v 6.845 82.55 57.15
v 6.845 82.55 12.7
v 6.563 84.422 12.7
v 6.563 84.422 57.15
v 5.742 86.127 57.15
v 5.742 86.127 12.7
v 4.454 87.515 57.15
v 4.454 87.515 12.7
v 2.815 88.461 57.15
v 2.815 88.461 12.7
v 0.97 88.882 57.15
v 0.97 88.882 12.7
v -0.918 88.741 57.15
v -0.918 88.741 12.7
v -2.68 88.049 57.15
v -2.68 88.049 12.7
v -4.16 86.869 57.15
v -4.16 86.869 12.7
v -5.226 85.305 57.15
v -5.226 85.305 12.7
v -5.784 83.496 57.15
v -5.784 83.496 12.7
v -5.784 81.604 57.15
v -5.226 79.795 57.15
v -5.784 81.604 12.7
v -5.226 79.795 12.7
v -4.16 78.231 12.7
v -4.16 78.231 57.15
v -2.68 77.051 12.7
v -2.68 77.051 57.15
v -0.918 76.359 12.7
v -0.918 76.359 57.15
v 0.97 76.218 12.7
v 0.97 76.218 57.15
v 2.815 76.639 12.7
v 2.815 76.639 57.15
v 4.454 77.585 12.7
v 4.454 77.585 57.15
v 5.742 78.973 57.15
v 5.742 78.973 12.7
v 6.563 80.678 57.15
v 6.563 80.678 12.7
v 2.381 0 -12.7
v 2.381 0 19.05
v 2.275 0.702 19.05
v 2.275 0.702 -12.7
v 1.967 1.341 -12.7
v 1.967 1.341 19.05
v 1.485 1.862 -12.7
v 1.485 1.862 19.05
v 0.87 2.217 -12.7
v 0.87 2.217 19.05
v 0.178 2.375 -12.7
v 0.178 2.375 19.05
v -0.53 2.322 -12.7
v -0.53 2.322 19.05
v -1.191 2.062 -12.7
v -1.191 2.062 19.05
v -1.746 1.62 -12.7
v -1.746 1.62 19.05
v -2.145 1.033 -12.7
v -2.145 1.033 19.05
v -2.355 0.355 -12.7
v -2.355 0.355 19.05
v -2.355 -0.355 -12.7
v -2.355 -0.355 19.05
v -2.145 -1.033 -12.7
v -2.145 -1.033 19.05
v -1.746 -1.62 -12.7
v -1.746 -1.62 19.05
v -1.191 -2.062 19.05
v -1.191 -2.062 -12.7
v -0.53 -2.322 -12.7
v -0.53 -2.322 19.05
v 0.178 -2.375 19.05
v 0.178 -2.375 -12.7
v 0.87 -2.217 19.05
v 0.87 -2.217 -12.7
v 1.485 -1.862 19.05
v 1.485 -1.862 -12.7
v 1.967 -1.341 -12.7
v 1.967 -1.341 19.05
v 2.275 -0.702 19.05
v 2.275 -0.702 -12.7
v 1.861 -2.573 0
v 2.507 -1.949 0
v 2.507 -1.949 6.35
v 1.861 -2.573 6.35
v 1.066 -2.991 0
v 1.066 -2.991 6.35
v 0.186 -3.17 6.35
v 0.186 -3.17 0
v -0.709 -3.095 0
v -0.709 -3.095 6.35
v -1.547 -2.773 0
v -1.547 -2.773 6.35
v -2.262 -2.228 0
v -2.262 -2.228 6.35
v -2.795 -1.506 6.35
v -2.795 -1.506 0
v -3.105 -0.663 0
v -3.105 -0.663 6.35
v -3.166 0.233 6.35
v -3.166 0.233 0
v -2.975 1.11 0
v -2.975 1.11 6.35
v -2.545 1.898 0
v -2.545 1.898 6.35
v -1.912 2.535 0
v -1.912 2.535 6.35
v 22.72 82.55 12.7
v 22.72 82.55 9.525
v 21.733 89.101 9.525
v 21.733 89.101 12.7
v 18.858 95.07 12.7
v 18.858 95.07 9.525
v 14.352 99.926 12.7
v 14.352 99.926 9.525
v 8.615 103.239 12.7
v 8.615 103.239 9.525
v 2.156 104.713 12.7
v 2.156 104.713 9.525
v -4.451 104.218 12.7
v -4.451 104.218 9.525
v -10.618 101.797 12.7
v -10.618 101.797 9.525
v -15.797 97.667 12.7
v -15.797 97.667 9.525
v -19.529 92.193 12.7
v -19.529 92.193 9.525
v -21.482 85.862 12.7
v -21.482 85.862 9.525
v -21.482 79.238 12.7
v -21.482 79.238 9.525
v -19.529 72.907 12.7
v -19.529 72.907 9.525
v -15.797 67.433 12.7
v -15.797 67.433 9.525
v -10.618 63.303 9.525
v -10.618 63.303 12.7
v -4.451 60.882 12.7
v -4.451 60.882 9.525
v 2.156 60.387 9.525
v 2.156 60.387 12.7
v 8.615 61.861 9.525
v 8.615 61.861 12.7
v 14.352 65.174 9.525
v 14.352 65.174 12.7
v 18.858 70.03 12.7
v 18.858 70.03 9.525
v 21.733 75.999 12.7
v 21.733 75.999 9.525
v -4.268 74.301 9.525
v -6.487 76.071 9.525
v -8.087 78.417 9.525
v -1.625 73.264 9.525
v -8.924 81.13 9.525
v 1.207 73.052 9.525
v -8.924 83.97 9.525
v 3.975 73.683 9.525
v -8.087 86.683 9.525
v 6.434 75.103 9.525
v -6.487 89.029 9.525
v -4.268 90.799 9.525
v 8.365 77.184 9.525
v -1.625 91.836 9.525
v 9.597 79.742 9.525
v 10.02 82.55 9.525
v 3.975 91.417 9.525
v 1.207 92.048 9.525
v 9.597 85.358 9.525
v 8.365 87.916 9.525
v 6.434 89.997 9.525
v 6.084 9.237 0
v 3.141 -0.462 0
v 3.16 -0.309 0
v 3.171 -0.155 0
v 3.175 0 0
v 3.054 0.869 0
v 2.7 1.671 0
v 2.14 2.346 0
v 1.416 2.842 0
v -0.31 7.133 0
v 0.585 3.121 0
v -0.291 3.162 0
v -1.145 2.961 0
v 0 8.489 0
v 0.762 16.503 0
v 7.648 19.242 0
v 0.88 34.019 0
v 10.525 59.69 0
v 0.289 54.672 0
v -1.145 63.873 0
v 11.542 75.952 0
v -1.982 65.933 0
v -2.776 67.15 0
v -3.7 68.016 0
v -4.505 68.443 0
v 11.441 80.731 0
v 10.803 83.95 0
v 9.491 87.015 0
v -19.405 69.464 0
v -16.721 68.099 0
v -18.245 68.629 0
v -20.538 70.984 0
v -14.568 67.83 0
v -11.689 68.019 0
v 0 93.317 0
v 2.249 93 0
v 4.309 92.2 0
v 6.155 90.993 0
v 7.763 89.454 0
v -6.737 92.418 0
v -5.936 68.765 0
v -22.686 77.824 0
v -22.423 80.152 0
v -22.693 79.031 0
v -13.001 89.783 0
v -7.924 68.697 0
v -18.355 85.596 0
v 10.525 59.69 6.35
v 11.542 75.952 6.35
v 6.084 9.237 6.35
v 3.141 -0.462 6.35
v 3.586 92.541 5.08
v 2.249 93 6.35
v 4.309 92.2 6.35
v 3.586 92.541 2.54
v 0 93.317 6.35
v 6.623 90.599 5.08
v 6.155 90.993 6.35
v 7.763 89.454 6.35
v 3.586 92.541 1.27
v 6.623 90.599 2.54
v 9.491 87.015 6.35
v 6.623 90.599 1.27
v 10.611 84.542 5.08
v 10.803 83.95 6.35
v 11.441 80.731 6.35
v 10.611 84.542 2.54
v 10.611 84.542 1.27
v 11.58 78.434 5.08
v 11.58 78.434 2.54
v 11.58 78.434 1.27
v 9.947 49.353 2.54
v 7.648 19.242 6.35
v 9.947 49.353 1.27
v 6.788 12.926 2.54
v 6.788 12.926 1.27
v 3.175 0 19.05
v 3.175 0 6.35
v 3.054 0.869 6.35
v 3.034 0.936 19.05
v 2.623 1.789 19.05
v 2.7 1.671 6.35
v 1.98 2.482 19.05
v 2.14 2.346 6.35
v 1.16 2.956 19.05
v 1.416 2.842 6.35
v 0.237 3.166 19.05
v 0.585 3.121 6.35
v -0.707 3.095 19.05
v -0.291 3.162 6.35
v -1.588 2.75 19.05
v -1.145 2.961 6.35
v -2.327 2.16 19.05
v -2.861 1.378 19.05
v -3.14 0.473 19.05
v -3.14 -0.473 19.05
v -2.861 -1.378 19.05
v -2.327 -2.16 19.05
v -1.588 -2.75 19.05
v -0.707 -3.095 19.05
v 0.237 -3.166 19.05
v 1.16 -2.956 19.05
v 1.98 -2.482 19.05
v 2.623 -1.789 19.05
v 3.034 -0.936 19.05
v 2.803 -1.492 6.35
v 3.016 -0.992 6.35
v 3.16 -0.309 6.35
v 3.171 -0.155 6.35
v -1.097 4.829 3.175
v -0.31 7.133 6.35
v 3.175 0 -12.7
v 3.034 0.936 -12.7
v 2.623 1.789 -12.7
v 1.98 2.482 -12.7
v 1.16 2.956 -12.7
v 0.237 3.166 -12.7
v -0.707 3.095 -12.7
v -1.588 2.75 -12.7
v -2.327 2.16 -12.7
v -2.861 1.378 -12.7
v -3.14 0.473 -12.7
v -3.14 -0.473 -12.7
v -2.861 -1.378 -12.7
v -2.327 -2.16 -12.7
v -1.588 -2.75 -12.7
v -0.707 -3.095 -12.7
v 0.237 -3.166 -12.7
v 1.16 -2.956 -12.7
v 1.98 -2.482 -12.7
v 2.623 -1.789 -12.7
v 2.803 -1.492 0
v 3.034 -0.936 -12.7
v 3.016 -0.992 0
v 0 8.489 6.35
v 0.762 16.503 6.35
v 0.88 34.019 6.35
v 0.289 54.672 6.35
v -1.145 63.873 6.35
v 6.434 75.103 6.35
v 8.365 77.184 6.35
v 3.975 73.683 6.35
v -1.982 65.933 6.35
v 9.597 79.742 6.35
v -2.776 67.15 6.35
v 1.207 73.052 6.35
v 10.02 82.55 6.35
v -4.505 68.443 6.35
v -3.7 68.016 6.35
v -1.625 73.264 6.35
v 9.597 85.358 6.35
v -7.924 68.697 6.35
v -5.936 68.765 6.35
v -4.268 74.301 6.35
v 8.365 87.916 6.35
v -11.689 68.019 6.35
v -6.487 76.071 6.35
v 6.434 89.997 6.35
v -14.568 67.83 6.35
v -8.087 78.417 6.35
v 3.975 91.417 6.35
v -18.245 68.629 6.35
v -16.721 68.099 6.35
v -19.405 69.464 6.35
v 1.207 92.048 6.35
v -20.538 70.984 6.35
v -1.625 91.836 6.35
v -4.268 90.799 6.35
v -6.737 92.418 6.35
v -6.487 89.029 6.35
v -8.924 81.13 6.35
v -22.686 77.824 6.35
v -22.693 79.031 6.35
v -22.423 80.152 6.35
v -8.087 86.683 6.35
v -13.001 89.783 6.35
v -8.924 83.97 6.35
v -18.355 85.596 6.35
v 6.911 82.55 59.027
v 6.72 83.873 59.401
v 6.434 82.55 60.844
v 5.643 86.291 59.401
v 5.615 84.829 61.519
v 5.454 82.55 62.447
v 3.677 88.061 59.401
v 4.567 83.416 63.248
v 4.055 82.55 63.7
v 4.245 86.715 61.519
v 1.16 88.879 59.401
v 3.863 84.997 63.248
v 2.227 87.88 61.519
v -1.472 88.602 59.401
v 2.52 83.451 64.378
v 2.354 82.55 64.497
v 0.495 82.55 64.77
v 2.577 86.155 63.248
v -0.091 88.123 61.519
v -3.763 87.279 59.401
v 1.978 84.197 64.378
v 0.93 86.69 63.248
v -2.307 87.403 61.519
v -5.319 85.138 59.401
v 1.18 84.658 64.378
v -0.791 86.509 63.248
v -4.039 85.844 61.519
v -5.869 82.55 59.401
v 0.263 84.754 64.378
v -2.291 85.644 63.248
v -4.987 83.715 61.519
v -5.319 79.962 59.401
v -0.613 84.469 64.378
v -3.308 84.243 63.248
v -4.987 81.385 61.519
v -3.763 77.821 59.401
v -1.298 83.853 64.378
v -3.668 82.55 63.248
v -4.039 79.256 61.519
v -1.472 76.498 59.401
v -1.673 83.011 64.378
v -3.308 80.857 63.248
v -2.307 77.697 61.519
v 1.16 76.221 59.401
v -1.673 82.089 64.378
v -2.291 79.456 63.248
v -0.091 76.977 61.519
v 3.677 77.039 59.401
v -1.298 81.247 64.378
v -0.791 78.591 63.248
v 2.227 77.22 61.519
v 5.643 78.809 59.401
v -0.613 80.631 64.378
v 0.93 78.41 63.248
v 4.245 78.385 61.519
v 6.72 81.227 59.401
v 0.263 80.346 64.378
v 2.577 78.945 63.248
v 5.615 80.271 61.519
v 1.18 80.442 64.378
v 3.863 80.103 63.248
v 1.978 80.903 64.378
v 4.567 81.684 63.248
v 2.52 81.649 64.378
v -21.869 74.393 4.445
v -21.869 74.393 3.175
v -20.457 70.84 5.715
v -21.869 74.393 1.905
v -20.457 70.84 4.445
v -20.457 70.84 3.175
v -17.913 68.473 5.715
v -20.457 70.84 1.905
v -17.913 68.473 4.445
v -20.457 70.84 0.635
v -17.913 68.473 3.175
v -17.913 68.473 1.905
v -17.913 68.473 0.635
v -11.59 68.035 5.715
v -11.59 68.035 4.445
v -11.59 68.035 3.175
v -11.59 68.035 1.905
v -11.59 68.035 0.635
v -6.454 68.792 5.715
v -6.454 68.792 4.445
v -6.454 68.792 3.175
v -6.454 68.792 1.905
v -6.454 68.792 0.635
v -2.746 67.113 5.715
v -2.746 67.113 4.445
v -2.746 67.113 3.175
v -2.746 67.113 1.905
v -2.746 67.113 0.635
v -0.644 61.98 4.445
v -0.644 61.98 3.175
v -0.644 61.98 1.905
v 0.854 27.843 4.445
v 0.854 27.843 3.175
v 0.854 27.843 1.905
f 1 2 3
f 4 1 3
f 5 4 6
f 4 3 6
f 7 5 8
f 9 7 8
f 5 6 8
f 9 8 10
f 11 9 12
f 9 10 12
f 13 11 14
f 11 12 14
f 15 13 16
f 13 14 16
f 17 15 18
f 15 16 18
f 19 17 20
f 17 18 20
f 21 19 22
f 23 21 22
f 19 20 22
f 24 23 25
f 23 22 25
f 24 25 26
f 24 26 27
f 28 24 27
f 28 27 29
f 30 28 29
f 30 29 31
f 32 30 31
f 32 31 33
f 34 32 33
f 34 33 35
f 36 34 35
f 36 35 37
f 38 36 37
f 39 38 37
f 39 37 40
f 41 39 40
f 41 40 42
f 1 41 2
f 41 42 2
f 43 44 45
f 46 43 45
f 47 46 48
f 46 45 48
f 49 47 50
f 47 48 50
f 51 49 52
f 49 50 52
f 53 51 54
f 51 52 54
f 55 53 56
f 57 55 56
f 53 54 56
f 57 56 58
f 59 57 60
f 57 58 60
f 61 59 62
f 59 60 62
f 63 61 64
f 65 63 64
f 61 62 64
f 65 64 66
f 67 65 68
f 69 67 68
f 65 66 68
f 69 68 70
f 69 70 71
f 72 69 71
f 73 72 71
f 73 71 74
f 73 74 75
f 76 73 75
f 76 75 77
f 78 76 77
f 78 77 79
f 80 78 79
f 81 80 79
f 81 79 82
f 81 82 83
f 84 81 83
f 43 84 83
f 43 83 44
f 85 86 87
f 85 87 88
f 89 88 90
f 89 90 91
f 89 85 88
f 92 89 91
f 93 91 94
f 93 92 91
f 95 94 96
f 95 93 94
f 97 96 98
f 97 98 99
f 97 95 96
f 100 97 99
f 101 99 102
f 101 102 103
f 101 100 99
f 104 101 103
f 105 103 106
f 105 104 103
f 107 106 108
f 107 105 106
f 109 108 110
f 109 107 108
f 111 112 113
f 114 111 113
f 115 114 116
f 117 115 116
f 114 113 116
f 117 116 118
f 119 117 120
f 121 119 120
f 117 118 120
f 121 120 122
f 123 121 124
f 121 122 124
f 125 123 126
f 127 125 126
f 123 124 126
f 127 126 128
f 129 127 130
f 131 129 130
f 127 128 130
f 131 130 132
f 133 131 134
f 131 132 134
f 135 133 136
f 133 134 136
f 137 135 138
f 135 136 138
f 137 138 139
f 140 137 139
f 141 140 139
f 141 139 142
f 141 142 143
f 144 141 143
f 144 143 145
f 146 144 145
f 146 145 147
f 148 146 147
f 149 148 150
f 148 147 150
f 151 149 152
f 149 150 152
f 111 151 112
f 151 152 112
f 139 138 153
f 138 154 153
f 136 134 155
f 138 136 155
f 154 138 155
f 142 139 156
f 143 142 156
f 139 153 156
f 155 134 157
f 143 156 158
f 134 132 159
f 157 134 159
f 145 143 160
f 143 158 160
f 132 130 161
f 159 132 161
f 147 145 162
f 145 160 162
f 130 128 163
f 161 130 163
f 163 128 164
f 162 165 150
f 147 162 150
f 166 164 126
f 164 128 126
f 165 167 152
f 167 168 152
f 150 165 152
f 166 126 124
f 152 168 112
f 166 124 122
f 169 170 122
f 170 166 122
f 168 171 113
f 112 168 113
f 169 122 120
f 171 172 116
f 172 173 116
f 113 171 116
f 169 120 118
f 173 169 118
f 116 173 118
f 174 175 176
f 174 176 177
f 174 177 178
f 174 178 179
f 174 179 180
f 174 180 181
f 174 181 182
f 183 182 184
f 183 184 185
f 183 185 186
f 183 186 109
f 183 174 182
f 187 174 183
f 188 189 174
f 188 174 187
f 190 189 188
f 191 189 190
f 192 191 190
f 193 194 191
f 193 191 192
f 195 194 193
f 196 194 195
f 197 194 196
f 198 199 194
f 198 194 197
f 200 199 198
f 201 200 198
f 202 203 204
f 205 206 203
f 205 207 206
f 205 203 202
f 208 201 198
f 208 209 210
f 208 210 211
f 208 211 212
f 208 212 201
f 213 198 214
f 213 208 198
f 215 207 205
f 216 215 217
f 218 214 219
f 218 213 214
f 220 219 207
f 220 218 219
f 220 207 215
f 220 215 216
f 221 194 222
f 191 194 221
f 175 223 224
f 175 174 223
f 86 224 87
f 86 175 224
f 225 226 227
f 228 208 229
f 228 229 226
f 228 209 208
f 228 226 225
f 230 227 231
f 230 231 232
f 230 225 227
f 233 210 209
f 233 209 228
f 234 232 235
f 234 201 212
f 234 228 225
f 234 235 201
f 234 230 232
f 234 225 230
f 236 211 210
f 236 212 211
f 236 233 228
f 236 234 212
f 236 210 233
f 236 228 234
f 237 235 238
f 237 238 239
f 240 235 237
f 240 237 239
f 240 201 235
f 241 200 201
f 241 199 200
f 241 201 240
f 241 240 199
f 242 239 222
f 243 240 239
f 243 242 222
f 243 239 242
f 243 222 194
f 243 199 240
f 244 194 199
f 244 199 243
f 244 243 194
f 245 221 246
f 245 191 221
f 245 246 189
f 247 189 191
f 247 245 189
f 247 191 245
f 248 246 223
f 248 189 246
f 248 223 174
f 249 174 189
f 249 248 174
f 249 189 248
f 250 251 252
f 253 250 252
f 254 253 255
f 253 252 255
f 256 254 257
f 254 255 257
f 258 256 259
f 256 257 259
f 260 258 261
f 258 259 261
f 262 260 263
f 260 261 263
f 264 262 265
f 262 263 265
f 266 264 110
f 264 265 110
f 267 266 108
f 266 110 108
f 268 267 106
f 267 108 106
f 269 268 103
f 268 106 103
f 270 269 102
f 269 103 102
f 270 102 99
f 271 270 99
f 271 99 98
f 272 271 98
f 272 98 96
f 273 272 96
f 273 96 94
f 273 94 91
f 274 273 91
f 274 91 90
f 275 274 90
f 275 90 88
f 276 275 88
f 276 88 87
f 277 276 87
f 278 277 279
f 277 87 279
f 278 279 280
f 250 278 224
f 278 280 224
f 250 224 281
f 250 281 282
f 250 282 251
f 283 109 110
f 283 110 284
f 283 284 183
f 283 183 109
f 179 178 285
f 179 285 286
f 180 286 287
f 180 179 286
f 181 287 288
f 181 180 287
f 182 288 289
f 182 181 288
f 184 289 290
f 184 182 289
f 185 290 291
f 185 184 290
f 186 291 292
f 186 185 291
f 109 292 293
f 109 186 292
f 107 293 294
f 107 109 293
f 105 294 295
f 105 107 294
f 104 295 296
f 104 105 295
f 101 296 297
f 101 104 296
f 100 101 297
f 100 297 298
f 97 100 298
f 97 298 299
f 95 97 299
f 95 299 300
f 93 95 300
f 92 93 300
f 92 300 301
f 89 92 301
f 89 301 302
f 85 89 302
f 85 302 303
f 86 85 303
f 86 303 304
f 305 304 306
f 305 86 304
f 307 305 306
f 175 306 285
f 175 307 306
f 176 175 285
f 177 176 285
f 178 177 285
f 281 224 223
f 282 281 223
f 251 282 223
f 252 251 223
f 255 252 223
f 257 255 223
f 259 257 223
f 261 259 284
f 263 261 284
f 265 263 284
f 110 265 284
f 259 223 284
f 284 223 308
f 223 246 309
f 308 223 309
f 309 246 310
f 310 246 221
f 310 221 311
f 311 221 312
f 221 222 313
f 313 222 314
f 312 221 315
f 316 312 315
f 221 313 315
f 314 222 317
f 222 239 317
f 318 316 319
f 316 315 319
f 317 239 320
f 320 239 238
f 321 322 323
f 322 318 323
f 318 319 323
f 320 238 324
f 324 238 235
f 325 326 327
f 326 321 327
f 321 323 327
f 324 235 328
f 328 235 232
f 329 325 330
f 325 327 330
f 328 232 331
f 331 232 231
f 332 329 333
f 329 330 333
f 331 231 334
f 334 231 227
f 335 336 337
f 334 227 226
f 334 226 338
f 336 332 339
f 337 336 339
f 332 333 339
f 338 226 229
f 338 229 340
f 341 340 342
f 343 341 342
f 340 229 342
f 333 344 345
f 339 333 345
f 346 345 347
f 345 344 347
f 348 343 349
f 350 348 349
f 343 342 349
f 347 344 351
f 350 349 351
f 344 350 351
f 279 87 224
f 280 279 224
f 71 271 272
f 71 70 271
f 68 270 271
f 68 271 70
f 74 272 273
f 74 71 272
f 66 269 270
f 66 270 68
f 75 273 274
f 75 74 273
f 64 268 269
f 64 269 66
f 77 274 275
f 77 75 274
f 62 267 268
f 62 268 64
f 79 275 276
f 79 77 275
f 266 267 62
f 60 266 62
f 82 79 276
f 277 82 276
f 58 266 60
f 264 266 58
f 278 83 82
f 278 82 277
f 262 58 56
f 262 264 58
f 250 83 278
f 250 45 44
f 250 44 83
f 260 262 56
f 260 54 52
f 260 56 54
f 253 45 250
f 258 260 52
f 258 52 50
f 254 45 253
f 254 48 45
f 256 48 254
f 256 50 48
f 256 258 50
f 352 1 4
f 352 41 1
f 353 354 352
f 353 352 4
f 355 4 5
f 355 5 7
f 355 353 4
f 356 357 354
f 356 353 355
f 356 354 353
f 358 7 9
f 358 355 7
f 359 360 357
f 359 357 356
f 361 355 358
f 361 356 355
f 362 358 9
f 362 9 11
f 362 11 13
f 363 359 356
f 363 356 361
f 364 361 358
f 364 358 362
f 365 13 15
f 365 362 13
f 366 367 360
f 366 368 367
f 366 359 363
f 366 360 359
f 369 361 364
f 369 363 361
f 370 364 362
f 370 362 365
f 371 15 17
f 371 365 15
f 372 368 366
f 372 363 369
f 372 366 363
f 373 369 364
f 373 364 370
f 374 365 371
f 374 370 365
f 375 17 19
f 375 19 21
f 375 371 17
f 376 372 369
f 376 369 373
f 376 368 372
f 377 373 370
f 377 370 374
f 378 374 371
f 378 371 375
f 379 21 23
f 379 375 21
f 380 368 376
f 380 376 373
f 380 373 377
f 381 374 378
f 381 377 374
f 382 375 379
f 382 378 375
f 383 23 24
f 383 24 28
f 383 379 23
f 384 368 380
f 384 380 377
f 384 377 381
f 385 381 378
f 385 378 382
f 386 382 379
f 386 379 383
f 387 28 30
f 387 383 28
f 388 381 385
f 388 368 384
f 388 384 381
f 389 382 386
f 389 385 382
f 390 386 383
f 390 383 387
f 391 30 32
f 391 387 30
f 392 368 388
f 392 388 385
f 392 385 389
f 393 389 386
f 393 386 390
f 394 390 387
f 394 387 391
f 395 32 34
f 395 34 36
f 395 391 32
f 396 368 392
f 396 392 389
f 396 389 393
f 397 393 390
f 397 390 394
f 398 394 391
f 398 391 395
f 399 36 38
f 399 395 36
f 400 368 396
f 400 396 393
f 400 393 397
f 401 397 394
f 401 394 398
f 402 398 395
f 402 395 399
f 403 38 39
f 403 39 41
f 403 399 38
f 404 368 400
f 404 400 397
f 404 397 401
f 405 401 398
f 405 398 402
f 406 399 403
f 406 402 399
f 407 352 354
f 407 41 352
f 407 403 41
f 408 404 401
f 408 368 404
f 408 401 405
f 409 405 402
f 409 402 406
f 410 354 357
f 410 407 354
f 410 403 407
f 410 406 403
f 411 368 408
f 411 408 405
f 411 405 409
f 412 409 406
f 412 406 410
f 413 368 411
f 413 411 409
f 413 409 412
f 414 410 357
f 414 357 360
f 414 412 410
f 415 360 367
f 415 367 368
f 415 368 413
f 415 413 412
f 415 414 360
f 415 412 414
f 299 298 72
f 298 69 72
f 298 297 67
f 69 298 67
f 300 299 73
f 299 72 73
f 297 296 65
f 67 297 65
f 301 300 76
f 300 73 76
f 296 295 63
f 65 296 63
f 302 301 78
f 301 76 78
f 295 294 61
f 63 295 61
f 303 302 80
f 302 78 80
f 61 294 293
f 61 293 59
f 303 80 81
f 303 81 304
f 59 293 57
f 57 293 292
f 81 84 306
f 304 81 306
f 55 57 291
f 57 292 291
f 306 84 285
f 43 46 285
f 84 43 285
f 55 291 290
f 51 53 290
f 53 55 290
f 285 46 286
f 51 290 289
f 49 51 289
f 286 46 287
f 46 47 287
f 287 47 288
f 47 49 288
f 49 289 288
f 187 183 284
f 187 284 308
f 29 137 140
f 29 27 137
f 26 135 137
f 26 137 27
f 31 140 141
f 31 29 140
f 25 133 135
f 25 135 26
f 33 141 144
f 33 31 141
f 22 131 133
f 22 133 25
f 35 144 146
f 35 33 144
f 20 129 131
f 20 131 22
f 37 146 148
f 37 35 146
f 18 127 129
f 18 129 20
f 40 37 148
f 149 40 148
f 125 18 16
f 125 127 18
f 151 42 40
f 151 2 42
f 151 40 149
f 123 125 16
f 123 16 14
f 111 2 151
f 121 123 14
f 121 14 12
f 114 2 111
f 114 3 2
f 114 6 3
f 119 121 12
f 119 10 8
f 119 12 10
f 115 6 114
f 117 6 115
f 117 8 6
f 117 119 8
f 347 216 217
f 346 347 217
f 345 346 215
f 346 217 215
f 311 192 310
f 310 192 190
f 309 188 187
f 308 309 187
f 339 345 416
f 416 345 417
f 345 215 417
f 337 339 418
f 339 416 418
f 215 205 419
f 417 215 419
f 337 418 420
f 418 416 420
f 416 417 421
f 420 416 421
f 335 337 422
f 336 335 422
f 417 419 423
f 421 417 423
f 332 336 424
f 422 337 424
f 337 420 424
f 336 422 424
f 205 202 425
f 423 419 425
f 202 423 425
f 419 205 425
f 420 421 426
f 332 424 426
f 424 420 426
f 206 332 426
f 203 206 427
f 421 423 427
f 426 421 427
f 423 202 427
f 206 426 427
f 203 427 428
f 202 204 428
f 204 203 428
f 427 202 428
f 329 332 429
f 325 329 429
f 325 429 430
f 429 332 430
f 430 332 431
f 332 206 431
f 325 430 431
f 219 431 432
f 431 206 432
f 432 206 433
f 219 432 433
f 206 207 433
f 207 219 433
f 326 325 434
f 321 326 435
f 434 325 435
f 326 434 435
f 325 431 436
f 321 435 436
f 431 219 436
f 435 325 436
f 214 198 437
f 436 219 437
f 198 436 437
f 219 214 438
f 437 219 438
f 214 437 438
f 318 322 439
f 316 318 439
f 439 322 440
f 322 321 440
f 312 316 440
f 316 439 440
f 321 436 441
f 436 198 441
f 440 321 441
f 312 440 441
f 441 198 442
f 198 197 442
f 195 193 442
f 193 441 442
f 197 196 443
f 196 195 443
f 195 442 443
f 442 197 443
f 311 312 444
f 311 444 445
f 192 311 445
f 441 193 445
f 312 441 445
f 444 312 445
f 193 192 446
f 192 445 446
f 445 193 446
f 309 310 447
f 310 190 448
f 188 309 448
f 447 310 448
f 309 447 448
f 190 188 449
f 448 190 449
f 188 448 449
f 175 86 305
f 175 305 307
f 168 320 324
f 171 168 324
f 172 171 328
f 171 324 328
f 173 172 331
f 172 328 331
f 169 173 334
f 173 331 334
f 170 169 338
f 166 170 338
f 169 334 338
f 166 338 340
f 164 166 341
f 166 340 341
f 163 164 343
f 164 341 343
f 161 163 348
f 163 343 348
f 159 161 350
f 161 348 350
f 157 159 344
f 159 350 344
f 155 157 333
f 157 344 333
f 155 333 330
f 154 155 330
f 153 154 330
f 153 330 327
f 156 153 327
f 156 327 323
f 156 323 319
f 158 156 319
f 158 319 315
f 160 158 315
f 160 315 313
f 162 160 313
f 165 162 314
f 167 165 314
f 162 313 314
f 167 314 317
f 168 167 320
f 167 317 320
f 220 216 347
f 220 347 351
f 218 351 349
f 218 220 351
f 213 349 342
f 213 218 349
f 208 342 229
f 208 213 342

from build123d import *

# Parameters (mm, degrees)
ARM_EXTRUDE_DEPTH               = 6.35
SKETCH2_R                       = 9.525
ARM_HANDLE_SPACER_EXTRUDE_DEPTH = 3.175
SKETCH3_R                       = 22.225
HANDLE_BASE_EXTRUDE_DEPTH       = 3.175
SKETCH5_R                       = 6.35
HANDLE_EXTRUDE_DEPTH            = 44.45
HANDLE_DOME_FACE_RADIUS         = 6.35
HANDLE_DOME_HEIGHT              = 7.62
SKETCH7_R                       = 3.175
ARM_SLIDER_FRONT_EXTRUDE_DEPTH  = 12.7
SKETCH8_R                       = 2.38125
CUT_EXTRUDE2_DEPTH              = 32.75


with BuildPart() as part:
    # Sketch1 → Arm Extrude (new body)
    with BuildSketch(Plane.XY):
        with BuildLine():
            Line((-0.310063399, 7.13327902), (0, 8.488899908))
            add(Edge.make_bspline(
                [(-22.423405471, 80.151651473), (-23.098171501, 78.484949301), (-21.710179313, 73.657775145), (-19.982664596, 68.767759849), (-12.453425552, 67.167681912), (-8.244325833, 69.309188007), (0.045366857, 67.680494517), (0.404487115, 52.749214724), (0.963776807, 37.596157832), (0.846768385, 32.342612133), (0.858192704, 19.921164935), (0.823670064, 12.744528573), (0, 8.488899908)],
                knots=[0, 0, 0, 0, 0.058727348, 0.134625817, 0.156810162, 0.266819613, 0.304169719, 0.492961109, 0.537826005, 0.707953781, 0.747032645, 0.907348672, 0.907348672, 0.907348672, 0.907348672], degree=3))
            ThreePointArc((-22.423405471, 80.151651473), (-13.001351905, 89.7825331), (0, 93.317193334))
            add(Edge.make_bspline(
                [(0, 93.317193334), (5.09918481, 93.206839261), (12.41398629, 85.562110082), (10.911801572, 68.491523269), (10.094953114, 49.982890958), (8.238650167, 25.055582438), (6.791847576, 7.644498002), (2.506632281, -1.9486969)],
                knots=[0, 0, 0, 0, 0.141745524, 0.264046814, 0.488239671, 0.695067487, 1, 1, 1, 1], degree=3))
            ThreePointArc((2.506632281, -1.9486969), (-2.26156039, -2.228445558), (-1.911512943, 2.535102221))
            add(Edge.make_bspline(
                [(-1.911512943, 2.535102221), (-1.082346176, 4.824407889), (-0.310063399, 7.13327902)],
                knots=[0, 0, 0, 1, 1, 1], degree=2))
        make_face()
    extrude(amount=ARM_EXTRUDE_DEPTH)

    # Sketch2 → Arm-Handle Spacer Extrude (add)
    with BuildSketch(Plane.XY.offset(6.35)):
        with Locations((0.494989456, 82.55)):
            Circle(SKETCH2_R)
    extrude(amount=ARM_HANDLE_SPACER_EXTRUDE_DEPTH)

    # Sketch3 → Handle Base Extrude (add)
    with BuildSketch(Plane.XY.offset(9.525)):
        with Locations((0.494989456, 82.55)):
            Circle(SKETCH3_R)
    extrude(amount=HANDLE_BASE_EXTRUDE_DEPTH)

    # Sketch5 → Handle Extrude (add)
    with BuildSketch(Plane.XY.offset(12.7)):
        with Locations((0.494989456, 82.55)):
            Circle(SKETCH5_R)
    extrude(amount=HANDLE_EXTRUDE_DEPTH)

    # Handle Dome: a dome of height H over a round flat face of radius A is a cap of a sphere of radius (A * A + H * H) / (2 * H)
    handle_dome_r = (HANDLE_DOME_FACE_RADIUS * HANDLE_DOME_FACE_RADIUS + HANDLE_DOME_HEIGHT * HANDLE_DOME_HEIGHT) / (2 * HANDLE_DOME_HEIGHT)
    handle_dome_base = Plane((0.494989456, 82.55, 57.15), z_dir=(0, 0, 1))
    with Locations(handle_dome_base.offset(HANDLE_DOME_HEIGHT - handle_dome_r)):
        handle_dome_ball = Sphere(handle_dome_r, mode=Mode.PRIVATE)
    add(split(handle_dome_ball, bisect_by=handle_dome_base, keep=Keep.TOP, mode=Mode.PRIVATE))

    # Sketch7 → Arm Slider Front Extrude (add)
    with BuildSketch(Plane.XY.offset(6.35)):
        Circle(SKETCH7_R)
    arm_slider_front_extrude = extrude(amount=ARM_SLIDER_FRONT_EXTRUDE_DEPTH)

    # Arm Slider Back Mirror: Arm Slider Front Extrude across plane
    add(arm_slider_front_extrude.mirror(Plane.XY.offset(3.175)))

    # Sketch8 → Cut-Extrude2 (cut, through all)
    with BuildSketch(Plane.XY.offset(19.05)):
        Circle(SKETCH8_R)
    extrude(amount=-CUT_EXTRUDE2_DEPTH, mode=Mode.SUBTRACT)


solid = part.part
